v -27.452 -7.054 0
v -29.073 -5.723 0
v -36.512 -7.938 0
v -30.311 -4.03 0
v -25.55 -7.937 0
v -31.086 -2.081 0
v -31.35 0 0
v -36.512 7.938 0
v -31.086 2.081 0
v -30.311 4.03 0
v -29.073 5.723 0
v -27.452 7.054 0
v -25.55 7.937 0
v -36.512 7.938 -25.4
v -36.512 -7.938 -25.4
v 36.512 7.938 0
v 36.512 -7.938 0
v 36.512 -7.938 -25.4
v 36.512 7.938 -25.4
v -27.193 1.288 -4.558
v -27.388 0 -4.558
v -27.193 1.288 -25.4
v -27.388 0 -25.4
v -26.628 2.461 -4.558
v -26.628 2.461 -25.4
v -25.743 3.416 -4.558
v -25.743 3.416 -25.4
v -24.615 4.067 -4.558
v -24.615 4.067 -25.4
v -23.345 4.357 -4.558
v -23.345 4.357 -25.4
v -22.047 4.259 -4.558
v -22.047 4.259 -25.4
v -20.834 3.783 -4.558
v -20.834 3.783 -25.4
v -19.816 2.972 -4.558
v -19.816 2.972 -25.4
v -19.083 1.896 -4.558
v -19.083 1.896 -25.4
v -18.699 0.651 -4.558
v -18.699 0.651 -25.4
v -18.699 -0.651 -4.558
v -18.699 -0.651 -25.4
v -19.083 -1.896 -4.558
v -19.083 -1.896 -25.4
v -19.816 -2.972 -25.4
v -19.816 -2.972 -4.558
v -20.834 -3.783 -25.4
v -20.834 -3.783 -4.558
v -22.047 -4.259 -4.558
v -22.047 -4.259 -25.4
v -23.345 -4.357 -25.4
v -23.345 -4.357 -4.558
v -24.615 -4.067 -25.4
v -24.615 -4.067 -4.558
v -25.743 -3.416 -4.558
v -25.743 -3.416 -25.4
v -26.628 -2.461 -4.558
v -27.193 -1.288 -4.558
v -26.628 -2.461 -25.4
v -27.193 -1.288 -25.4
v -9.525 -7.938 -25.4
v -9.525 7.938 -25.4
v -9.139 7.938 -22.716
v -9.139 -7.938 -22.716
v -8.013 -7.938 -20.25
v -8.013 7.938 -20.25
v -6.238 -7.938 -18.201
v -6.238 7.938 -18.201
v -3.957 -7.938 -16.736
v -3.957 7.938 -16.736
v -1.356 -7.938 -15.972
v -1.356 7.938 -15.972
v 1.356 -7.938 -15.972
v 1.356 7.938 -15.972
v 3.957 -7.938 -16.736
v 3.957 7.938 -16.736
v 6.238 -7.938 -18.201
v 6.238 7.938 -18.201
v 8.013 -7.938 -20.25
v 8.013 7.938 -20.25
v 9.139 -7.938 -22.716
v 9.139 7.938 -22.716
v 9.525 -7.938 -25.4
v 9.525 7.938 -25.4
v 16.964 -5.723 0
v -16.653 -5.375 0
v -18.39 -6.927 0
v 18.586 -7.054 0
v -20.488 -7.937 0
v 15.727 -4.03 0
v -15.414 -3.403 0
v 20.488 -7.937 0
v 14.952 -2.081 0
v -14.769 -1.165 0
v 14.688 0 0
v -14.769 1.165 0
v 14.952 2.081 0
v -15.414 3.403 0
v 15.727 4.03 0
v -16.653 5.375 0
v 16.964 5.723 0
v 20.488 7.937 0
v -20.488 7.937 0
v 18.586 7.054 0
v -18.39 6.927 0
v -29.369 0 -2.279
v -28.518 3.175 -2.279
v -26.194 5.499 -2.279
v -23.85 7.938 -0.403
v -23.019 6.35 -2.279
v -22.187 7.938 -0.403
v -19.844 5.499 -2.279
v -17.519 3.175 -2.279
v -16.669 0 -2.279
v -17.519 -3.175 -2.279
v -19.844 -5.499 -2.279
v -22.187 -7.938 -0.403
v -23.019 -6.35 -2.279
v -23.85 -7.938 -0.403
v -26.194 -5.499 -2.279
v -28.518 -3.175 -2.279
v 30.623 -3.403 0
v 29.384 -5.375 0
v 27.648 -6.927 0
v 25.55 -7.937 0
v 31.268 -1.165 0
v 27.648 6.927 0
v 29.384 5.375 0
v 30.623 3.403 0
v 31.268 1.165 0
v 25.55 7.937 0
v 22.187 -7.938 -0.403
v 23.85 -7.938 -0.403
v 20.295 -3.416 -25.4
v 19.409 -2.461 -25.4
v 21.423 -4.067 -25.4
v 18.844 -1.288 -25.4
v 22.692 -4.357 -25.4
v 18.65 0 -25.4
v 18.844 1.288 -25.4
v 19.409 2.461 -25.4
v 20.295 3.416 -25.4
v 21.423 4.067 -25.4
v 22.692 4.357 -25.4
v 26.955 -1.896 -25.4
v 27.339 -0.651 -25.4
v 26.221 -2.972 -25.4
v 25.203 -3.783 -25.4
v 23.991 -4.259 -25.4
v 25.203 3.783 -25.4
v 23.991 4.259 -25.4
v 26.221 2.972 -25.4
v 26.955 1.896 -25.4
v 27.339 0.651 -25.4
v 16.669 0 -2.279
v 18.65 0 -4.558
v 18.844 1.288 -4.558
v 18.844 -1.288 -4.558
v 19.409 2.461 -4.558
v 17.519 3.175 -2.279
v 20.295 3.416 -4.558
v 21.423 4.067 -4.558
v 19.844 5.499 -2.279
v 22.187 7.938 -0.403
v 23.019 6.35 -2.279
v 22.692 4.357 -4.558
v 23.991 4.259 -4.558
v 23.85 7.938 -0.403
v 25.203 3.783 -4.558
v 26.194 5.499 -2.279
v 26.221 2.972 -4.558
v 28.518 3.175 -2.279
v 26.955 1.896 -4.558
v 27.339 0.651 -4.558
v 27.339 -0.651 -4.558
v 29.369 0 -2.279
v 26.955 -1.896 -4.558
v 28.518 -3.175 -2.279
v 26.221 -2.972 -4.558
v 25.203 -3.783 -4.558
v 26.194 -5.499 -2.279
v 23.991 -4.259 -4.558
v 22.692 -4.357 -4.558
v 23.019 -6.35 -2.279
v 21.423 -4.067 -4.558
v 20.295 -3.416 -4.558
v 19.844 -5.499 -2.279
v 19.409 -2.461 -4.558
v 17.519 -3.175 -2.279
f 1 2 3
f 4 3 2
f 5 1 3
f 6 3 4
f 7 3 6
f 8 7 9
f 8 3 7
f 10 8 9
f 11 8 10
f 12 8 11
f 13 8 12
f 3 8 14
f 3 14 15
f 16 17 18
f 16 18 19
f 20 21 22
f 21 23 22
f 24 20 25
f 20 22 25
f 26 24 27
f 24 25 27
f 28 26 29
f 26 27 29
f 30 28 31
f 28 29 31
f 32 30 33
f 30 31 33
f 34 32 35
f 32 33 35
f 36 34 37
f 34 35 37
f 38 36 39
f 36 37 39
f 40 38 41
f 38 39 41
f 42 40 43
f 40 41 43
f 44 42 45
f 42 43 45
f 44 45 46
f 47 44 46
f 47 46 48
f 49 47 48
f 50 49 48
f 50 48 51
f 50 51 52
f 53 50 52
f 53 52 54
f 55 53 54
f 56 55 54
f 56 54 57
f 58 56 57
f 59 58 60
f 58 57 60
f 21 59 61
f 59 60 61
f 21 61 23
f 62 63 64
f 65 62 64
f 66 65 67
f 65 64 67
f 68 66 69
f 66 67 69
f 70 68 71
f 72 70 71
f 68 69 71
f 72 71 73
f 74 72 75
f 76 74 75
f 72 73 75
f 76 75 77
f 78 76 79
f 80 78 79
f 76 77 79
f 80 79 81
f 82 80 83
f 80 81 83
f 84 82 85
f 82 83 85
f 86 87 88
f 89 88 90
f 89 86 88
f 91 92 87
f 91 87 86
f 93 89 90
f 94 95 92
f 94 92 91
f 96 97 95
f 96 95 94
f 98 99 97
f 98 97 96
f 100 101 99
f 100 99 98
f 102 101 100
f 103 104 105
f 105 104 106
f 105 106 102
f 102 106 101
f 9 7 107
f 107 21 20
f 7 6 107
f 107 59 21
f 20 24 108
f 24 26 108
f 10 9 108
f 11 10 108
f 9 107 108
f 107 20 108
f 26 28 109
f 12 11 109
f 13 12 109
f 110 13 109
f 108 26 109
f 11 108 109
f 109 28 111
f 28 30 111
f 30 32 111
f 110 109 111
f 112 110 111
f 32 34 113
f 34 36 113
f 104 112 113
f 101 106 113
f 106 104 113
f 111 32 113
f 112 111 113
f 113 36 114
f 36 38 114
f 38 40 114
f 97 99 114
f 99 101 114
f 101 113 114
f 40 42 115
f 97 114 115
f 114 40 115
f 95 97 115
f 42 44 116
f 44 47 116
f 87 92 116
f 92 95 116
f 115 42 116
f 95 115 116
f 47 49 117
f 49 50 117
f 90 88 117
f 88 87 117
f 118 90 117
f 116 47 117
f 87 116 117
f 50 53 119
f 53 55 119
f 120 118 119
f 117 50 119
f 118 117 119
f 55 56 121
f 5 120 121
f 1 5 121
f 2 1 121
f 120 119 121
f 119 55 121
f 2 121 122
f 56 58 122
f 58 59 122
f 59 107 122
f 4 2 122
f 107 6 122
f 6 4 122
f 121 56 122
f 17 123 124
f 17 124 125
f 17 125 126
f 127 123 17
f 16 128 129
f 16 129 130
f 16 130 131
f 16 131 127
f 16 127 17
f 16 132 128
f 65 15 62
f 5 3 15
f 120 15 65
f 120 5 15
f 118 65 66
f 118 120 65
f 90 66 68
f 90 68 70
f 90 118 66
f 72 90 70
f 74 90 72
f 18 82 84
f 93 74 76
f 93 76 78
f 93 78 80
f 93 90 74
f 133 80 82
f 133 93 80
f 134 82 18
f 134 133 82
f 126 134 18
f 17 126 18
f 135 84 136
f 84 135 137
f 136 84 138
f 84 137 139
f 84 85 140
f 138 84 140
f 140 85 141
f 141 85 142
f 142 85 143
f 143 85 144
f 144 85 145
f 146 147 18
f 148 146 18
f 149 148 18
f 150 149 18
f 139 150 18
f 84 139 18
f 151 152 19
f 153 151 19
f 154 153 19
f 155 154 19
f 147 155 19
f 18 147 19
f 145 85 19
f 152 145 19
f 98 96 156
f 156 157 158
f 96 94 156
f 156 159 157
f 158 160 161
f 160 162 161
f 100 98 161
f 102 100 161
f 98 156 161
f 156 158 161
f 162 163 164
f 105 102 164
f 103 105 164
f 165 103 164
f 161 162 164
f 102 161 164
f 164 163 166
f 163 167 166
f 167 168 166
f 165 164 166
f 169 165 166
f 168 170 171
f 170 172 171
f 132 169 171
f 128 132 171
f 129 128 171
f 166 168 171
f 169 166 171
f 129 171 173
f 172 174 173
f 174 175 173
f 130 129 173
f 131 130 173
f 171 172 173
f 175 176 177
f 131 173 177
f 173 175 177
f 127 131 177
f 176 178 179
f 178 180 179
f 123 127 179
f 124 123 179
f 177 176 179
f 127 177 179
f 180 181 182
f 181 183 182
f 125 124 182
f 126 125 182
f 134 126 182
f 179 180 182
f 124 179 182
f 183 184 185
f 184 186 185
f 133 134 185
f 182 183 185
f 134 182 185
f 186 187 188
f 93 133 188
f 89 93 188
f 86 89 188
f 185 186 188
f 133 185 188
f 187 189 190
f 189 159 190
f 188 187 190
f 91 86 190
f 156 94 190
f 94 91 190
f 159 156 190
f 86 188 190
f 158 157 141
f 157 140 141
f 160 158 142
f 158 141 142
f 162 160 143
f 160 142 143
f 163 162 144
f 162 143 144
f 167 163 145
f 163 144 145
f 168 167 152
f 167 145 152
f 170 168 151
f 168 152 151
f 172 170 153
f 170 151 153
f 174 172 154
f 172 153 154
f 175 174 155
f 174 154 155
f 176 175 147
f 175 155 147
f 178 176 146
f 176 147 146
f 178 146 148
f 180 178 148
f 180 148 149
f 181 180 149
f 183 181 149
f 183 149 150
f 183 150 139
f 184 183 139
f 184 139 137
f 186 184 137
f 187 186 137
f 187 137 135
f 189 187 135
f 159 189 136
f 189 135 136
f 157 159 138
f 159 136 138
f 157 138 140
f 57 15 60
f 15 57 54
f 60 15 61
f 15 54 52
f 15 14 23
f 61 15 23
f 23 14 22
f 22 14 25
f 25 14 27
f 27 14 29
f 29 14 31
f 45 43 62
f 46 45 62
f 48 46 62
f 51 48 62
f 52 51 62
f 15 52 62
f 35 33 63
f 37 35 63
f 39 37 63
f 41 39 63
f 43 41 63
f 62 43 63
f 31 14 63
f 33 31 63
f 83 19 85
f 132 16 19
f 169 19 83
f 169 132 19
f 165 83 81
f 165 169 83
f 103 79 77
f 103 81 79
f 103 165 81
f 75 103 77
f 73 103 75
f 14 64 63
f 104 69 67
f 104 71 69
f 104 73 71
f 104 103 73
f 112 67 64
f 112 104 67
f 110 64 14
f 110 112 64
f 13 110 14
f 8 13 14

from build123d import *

# Parameters (mm, degrees)
F1_DEPTH       = 25.4
F2_D           = 8.7376
F2_DEPTH       = 29.6333418
F2_CSINK_D     = 16.6624
F2_CSINK_ANGLE = 82
F2_TIP         = 2.6250398724
F4_D           = 19.05


# Not quite as in the source:
# - a feature names something its author has since deleted; it is built from what else it names


with BuildPart() as f1:
    # F0 (on Top) → F1 (new body)
    with BuildSketch(Plane.XY):
        Polygon((36.5125, -7.9375), (36.5125, 7.9375), (0, 7.9375), (-36.5125, 7.9375), (-36.5125, -7.9375), align=None)
    extrude(amount=-F1_DEPTH)

    # F2
    with Locations(Plane.XY):
        with Locations((-23.01875, 0), (23.01875, 0)):
            CounterSinkHole(F2_D / 2, F2_CSINK_D / 2, depth=F2_DEPTH, counter_sink_angle=F2_CSINK_ANGLE)
            with Locations((0, 0, -(F2_DEPTH + F2_TIP / 2))):  # 118° drill point
                Cone(0, F2_D / 2, F2_TIP, mode=Mode.SUBTRACT)

    # F4 (through all)
    with Locations(Plane.XZ.offset(7.9375)):
        with Locations((0, -25.4)):
            Hole(F4_D / 2)


solid = f1.part
